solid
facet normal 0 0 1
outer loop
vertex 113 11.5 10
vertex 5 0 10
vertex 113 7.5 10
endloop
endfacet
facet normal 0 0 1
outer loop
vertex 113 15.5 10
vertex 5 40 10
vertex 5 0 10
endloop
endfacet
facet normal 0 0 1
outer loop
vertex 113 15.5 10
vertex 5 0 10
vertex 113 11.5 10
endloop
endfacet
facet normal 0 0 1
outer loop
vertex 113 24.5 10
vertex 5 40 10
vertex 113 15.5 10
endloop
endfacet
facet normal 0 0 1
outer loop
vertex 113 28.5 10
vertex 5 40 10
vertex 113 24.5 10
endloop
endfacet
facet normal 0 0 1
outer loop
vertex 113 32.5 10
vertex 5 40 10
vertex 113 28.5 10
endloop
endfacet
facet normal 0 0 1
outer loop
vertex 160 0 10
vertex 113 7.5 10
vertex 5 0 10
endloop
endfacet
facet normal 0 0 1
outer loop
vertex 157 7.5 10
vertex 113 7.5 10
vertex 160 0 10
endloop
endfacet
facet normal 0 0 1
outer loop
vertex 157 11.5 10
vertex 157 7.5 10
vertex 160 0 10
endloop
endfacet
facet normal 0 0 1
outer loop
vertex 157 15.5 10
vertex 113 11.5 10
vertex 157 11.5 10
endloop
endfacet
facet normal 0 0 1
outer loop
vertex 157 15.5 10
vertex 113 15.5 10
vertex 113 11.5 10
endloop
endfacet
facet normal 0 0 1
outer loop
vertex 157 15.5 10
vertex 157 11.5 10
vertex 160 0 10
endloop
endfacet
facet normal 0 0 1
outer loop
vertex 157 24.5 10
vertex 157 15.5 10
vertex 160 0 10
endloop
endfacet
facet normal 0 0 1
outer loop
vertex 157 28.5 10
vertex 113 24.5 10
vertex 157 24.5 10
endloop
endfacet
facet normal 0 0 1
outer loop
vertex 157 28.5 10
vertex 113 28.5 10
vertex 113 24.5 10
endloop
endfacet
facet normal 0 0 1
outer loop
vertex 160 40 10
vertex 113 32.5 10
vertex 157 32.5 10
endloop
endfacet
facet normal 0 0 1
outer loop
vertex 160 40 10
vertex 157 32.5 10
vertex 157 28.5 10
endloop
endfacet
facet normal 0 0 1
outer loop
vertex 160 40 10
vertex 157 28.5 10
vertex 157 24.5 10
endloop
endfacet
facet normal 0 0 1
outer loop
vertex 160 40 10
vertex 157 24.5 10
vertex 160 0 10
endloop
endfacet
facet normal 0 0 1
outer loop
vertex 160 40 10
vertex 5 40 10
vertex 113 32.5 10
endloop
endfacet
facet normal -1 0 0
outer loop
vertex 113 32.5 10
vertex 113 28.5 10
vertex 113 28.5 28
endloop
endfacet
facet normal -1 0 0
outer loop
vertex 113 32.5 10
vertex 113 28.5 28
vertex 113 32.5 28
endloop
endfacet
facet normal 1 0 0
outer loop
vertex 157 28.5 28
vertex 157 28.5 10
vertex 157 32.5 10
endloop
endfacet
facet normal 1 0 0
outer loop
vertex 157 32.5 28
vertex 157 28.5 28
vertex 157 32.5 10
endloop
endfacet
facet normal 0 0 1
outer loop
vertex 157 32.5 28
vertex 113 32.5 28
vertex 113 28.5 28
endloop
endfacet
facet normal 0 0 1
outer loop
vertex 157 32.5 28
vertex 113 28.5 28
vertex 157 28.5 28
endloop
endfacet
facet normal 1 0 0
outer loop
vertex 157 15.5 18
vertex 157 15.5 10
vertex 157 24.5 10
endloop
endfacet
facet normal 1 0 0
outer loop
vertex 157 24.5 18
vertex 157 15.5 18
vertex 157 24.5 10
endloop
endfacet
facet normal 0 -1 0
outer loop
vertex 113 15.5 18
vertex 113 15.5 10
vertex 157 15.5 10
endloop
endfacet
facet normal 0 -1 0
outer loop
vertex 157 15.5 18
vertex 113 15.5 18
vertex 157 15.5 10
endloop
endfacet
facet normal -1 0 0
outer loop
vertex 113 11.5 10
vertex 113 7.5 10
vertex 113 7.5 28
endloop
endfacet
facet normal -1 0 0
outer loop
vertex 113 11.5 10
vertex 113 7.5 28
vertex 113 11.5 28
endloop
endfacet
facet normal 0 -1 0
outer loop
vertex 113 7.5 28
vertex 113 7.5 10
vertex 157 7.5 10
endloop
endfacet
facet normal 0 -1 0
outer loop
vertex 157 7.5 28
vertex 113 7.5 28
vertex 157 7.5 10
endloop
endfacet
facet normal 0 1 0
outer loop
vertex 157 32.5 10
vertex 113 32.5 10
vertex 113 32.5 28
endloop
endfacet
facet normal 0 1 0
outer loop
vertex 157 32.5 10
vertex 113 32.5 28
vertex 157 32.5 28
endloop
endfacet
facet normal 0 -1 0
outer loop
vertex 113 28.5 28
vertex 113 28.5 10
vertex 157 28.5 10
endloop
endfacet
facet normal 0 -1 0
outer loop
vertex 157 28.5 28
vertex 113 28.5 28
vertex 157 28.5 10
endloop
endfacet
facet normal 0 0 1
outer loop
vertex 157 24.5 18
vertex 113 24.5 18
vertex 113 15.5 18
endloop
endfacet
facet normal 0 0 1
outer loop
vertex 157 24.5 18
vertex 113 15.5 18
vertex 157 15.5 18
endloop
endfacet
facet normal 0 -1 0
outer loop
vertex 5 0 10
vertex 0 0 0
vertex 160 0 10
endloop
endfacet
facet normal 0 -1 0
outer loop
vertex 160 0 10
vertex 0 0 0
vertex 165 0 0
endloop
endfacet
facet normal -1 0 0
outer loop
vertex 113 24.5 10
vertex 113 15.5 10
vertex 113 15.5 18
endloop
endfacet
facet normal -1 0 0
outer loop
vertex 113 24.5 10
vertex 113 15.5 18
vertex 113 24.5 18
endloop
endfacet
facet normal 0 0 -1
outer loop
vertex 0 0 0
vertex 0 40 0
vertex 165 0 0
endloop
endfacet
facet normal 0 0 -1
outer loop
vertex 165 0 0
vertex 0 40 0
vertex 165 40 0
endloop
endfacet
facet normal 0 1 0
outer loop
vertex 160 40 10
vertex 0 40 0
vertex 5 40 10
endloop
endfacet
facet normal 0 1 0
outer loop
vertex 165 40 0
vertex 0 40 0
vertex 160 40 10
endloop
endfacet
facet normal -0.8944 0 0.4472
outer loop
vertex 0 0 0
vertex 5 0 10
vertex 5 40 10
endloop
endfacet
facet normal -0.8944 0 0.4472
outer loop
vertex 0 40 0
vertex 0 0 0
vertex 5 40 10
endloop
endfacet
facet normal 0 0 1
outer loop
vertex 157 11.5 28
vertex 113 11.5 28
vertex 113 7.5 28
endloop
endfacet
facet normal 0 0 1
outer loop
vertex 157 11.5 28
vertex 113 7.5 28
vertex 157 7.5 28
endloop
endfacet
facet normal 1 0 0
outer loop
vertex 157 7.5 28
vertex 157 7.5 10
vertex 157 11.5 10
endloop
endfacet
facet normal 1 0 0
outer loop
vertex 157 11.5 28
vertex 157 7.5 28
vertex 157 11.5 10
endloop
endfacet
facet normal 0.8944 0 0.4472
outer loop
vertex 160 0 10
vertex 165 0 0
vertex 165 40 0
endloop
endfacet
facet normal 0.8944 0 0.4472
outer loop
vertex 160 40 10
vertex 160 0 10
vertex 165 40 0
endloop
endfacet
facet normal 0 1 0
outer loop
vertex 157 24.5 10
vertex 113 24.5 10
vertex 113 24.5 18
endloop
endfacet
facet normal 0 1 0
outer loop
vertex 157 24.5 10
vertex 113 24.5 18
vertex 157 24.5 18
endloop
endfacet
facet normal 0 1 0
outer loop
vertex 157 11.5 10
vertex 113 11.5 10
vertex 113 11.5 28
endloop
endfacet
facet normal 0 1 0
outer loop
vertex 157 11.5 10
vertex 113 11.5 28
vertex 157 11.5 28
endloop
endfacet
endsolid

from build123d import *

# Parameters (mm, degrees)
F0_W     = 165
F0_H     = 40
F1_DEPTH = 10
F2_SIZE2 = 9.99999
F2_SIZE  = 4.99999
F3_SIZE2 = 4.99999
F3_SIZE  = 9.99999
F4_W     = 44
F4_H     = 4
F5_DEPTH = 18
F4_H_2   = 9
F6_DEPTH = 8


# Not quite as in the source:
# - a fillet or chamfer is up to 0.001 mm smaller than in the source, because OpenCascade refuses the exact size


with BuildPart() as f1:
    # F0 (on Top) → F1 (new body)
    with BuildSketch(Plane.XY):
        with Locations((82.5, 20)):
            Rectangle(F0_W, F0_H)
    extrude(amount=F1_DEPTH)

    # F2 (size 5 and 10 in the source; OpenCascade refuses exactly that, so slightly less here)
    f2_edges = [f1.edges().sort_by_distance(p)[0] for p in [
        (165, 20, 10),
    ]]
    f2_side = f1.faces().sort_by_distance((82.5, 20, 10))[0]
    chamfer(f2_edges, length=F2_SIZE, length2=F2_SIZE2, reference=f2_side)

    # F3 (size 10 and 5 in the source; OpenCascade refuses exactly that, so slightly less here)
    f3_edges = [f1.edges().sort_by_distance(p)[0] for p in [
        (0, 20, 10),
    ]]
    f3_side = f1.faces().sort_by_distance((0, 20, 5))[0]
    chamfer(f3_edges, length=F3_SIZE, length2=F3_SIZE2, reference=f3_side)

    # F4 (on face) → F5 (join)
    with BuildSketch(Plane.XY.offset(10)):
        with Locations((135, 30.5)):
            Rectangle(F4_W, F4_H)
        with Locations((135, 9.5)):
            Rectangle(F4_W, F4_H)
    extrude(amount=F5_DEPTH)

    # F4 (on face) → F6 (join)
    with BuildSketch(Plane.XY.offset(10)):
        with Locations((135, 20)):
            Rectangle(F4_W, F4_H_2)
    extrude(amount=F6_DEPTH)


solid = f1.part
